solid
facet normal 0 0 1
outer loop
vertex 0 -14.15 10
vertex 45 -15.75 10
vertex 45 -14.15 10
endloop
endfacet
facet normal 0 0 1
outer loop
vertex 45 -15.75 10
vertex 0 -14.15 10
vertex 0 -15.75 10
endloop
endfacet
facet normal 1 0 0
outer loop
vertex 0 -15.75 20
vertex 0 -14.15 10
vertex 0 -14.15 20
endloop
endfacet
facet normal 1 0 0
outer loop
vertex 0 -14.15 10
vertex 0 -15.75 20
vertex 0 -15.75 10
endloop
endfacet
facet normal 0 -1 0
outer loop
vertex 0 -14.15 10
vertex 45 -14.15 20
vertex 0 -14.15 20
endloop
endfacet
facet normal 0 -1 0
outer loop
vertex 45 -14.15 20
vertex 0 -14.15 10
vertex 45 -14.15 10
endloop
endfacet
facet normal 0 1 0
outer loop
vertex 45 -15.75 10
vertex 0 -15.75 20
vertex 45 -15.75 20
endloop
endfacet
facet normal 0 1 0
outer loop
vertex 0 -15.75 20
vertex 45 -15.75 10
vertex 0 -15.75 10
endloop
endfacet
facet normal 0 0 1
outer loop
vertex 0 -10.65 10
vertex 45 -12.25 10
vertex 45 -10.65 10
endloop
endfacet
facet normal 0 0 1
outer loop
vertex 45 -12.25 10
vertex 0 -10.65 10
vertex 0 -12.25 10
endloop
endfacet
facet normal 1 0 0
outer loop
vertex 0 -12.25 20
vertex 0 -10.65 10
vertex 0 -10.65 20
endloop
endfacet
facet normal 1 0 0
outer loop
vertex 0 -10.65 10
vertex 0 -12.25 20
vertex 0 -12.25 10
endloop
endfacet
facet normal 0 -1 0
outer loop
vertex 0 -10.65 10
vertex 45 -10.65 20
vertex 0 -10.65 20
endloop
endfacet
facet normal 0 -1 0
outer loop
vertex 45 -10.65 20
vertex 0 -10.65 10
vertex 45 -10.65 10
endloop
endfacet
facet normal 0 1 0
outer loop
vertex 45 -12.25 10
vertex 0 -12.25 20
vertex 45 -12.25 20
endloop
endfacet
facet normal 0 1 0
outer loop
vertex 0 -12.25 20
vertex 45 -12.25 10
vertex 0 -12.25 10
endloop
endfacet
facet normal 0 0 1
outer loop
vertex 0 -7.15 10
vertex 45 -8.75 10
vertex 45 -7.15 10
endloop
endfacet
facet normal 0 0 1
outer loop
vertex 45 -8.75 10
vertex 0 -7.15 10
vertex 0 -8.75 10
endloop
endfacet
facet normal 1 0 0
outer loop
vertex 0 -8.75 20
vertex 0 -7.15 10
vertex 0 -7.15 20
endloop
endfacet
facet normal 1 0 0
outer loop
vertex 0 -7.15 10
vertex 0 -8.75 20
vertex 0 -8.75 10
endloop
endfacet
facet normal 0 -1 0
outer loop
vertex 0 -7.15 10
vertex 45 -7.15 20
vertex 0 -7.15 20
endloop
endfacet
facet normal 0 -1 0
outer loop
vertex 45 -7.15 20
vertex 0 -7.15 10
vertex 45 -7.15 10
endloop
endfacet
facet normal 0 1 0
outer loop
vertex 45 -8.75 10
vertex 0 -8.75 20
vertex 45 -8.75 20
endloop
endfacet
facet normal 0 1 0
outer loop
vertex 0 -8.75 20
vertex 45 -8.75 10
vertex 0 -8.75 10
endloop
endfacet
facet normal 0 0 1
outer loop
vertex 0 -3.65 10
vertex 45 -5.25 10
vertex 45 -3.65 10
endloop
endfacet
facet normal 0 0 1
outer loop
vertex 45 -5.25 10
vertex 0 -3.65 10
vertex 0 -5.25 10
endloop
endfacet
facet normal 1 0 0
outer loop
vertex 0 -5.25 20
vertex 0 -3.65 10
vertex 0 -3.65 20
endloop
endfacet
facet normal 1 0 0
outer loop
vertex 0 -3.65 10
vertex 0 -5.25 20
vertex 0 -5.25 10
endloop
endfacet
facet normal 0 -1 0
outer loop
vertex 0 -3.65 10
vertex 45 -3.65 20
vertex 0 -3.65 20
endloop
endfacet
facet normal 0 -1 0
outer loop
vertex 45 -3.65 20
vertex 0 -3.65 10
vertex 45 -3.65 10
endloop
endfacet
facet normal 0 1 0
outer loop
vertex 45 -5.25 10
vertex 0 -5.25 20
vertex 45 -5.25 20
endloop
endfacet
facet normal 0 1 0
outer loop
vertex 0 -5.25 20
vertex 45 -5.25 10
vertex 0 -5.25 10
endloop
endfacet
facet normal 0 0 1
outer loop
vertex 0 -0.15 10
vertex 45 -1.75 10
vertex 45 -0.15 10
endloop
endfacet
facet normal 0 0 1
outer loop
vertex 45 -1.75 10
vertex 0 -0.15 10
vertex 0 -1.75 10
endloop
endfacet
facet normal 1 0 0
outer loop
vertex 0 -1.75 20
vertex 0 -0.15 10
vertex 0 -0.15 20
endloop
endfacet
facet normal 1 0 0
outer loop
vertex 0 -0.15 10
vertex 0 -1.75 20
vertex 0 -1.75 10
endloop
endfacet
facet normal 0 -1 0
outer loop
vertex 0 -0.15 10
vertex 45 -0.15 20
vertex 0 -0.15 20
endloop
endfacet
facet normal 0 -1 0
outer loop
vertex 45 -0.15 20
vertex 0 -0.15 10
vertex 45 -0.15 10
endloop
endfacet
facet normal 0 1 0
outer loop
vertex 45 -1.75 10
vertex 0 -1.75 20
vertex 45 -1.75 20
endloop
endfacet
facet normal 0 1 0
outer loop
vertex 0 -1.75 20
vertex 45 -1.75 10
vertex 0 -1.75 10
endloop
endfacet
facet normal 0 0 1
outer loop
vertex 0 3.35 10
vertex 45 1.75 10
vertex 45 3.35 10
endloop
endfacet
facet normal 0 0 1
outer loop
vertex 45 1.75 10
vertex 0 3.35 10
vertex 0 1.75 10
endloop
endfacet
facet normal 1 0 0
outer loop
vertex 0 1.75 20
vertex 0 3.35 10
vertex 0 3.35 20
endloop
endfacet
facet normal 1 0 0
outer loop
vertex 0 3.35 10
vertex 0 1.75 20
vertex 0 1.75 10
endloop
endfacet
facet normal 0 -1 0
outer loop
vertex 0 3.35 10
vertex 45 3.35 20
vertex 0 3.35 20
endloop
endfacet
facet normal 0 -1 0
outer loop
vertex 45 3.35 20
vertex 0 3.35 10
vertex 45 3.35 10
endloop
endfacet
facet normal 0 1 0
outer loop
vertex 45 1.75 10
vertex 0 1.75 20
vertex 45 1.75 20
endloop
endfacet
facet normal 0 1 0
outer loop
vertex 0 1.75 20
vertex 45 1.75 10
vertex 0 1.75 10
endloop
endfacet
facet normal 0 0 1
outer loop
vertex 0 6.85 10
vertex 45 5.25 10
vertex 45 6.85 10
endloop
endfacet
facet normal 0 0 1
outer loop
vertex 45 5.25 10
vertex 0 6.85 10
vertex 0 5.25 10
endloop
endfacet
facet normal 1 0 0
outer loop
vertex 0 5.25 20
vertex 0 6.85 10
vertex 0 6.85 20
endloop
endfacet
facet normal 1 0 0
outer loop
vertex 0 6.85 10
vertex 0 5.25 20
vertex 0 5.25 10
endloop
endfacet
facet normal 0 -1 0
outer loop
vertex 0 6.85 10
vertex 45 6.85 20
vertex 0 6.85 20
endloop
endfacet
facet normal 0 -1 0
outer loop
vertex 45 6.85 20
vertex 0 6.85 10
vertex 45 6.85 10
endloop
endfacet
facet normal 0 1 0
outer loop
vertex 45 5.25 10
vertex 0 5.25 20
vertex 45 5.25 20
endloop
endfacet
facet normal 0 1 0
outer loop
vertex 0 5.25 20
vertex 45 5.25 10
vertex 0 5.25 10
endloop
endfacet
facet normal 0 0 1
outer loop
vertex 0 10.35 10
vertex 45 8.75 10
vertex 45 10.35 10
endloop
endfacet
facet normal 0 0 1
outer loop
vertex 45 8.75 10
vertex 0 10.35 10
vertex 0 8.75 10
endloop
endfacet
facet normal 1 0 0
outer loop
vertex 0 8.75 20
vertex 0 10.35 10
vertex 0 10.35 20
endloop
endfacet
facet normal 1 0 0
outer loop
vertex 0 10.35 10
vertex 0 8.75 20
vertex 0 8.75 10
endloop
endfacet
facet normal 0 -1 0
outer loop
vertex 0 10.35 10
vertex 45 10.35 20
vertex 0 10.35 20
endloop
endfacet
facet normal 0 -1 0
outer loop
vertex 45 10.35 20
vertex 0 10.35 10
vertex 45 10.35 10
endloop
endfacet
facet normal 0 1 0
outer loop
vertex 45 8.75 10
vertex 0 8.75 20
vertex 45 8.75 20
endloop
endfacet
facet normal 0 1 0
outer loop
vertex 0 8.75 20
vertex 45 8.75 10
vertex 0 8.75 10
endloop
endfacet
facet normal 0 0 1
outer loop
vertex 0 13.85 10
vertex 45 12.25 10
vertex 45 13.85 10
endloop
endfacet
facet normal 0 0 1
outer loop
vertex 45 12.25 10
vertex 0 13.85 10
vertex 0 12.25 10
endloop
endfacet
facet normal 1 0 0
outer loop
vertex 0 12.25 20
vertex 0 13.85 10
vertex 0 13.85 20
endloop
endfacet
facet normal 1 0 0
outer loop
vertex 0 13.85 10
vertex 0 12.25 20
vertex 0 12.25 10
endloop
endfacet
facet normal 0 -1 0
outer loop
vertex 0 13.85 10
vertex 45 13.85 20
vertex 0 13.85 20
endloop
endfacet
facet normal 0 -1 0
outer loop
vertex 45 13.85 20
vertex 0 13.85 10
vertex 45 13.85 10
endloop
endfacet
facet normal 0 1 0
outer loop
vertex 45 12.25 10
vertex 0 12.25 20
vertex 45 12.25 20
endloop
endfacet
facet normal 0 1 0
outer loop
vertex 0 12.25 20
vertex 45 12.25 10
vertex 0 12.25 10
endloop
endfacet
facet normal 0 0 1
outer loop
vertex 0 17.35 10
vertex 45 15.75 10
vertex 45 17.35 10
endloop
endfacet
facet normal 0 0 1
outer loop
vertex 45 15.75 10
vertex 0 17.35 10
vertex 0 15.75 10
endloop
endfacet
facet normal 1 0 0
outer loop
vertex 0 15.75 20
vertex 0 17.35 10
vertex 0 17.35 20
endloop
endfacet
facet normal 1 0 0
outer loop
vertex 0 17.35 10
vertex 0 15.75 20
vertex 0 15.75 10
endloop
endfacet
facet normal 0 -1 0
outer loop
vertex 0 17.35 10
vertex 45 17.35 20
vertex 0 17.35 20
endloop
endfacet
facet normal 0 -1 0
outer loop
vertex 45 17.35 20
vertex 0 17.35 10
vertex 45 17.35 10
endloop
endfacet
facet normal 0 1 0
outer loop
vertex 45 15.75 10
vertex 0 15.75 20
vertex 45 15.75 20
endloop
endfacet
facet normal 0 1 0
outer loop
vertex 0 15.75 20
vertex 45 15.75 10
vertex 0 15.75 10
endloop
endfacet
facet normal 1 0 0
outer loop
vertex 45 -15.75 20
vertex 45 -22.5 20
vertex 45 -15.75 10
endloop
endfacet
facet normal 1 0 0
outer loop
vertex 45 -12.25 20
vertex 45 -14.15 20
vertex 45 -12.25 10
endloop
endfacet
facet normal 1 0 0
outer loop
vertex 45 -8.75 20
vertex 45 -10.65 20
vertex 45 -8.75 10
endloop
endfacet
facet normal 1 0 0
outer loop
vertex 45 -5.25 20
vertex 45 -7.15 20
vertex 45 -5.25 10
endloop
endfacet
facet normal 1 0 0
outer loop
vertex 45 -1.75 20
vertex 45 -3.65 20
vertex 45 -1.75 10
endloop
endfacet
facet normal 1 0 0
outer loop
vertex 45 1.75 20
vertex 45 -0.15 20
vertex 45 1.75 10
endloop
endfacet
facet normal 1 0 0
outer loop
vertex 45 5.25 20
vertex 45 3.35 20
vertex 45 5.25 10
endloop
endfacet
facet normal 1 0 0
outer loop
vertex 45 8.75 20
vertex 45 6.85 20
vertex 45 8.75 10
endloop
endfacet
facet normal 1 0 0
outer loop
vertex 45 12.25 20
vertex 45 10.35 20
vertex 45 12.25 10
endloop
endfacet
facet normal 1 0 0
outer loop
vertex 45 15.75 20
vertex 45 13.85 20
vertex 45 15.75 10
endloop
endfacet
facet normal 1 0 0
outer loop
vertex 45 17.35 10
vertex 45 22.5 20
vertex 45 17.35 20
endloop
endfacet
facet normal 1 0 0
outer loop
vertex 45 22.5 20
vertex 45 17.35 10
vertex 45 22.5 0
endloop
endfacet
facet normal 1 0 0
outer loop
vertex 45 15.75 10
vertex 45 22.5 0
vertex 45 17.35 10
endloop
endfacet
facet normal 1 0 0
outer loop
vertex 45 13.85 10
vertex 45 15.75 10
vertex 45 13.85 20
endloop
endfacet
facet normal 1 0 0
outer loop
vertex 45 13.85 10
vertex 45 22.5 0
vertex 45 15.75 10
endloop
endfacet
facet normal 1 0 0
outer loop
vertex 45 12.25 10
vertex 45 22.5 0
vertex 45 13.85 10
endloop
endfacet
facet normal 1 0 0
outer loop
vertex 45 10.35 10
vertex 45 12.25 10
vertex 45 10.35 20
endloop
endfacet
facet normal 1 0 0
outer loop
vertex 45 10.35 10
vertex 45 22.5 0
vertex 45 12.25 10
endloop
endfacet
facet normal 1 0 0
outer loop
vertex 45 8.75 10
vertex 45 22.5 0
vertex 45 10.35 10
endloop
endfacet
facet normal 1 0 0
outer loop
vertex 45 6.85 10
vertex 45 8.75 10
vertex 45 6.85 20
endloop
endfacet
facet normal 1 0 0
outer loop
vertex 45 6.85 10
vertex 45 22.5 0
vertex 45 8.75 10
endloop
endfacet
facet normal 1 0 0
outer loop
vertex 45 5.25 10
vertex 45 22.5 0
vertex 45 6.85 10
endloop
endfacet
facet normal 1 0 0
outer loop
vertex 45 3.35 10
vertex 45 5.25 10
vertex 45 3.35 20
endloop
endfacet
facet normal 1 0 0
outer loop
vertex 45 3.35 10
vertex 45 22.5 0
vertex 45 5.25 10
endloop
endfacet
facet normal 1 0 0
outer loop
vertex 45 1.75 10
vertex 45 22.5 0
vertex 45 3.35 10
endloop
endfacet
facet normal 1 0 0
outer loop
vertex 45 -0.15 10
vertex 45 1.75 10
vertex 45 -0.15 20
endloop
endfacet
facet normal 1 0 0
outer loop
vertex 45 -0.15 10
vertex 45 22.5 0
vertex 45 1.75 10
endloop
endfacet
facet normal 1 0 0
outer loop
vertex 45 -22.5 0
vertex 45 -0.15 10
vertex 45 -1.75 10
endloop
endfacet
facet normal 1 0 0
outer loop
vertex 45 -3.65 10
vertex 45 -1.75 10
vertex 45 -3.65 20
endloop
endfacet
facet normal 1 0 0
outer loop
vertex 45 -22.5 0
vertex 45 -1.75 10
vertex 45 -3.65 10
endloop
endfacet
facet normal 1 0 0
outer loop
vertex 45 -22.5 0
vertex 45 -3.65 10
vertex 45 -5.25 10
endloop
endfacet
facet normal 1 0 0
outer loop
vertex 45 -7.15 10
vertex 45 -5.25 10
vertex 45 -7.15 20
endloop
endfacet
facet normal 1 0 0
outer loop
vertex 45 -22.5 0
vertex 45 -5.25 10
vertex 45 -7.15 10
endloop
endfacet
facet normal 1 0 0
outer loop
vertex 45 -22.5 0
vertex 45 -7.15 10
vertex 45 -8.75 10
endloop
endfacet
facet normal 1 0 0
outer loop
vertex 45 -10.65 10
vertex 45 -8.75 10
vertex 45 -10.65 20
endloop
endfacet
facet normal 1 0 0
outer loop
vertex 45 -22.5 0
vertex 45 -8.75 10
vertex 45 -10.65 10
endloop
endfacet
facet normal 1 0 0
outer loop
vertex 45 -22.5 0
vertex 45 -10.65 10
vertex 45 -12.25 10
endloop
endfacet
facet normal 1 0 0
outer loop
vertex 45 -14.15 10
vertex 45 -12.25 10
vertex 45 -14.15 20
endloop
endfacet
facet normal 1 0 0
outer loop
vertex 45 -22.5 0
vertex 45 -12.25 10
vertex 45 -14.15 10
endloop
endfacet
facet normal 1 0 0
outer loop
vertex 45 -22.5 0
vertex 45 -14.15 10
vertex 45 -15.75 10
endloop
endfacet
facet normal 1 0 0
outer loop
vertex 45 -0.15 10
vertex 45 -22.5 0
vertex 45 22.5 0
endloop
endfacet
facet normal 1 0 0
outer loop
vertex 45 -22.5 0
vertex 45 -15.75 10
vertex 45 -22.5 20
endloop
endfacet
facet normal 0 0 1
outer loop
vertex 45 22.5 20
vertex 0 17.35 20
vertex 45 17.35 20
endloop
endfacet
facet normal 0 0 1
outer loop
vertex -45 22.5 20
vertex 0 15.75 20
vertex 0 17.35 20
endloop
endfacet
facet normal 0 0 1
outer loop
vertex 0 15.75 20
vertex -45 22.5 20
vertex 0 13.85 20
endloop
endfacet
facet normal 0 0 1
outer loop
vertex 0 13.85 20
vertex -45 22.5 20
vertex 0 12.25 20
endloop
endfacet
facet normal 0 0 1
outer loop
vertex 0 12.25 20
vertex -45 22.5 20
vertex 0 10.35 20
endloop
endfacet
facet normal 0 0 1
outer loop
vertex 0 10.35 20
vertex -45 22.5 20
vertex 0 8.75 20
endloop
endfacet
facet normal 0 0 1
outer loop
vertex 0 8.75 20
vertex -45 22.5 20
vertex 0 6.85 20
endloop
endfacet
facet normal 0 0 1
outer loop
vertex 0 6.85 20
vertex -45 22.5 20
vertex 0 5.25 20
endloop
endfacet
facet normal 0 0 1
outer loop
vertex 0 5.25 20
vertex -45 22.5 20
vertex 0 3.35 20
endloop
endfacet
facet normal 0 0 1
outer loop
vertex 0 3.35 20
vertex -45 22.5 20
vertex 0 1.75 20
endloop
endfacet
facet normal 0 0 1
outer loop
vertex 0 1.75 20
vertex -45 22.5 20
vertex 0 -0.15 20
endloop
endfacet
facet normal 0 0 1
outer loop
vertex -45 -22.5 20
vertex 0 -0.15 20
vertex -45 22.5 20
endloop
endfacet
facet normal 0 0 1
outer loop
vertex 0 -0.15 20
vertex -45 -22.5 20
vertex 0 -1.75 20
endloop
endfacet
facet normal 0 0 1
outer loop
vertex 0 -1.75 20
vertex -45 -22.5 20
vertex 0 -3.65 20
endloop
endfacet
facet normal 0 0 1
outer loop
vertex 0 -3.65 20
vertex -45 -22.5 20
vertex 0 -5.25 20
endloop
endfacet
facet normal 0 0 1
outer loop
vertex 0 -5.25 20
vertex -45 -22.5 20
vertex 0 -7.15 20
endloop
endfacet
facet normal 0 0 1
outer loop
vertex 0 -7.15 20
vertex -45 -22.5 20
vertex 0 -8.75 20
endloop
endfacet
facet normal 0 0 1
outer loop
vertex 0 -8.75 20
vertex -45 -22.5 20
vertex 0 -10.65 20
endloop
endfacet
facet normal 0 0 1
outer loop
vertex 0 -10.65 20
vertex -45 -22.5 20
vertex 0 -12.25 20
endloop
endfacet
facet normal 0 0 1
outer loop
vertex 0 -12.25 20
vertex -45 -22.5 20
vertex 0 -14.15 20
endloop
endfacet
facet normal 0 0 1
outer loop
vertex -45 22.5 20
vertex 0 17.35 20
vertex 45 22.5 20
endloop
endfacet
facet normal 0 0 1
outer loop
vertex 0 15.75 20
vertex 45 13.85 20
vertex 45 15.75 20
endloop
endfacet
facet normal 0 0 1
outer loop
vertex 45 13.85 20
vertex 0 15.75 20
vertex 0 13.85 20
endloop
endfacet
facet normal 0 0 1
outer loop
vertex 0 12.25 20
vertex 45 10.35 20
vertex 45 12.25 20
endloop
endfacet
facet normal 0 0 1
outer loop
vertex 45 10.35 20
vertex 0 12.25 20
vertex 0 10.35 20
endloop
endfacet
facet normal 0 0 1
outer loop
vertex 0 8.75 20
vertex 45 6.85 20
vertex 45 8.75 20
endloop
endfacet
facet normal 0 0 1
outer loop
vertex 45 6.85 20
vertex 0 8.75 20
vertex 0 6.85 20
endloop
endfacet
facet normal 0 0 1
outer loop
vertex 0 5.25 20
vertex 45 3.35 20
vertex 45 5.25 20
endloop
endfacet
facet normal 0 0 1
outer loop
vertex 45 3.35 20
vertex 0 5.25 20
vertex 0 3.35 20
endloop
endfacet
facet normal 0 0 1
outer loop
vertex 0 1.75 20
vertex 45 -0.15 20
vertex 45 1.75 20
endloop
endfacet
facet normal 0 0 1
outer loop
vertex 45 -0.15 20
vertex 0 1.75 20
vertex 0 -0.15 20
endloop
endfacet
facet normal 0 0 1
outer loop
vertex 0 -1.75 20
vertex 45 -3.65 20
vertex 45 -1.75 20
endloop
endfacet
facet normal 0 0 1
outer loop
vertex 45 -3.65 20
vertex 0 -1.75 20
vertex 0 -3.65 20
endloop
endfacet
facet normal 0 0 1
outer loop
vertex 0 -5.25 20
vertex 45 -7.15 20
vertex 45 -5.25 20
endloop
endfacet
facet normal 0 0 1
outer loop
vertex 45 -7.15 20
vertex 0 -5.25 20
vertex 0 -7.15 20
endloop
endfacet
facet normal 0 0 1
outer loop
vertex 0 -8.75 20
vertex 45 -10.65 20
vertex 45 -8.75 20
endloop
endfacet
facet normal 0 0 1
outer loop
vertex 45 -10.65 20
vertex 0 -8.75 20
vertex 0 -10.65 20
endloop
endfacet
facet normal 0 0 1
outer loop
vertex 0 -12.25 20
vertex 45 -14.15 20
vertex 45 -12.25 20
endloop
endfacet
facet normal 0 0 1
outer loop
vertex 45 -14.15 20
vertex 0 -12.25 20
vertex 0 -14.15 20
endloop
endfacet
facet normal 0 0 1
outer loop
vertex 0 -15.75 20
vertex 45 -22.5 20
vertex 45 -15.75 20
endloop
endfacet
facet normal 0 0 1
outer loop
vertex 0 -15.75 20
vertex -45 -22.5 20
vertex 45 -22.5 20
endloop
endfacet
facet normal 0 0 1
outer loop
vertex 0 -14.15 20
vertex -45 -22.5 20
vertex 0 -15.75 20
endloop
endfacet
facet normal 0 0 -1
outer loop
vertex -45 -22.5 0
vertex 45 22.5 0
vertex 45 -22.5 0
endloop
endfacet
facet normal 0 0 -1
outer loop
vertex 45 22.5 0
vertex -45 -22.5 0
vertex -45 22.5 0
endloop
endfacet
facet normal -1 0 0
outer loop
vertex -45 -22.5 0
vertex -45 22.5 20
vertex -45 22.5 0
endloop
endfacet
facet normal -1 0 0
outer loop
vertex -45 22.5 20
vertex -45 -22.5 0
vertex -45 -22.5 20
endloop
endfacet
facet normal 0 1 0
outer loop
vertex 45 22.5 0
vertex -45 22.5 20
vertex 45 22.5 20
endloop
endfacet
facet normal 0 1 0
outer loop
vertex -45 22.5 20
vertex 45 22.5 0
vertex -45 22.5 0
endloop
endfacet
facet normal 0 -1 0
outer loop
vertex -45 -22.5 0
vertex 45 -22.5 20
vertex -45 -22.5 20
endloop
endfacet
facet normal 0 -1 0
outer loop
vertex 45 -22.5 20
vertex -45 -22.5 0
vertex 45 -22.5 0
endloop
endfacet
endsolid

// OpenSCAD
// Slide drying rack for microscope slides (75 x 25 x 1 mm)
// Print orientation: base on XY plane, slots open upward (+Z)

// ---------- Block ----------
block_len   = 90;    // block length along X (mm)
block_wid   = 45;    // block width along Y (mm)
block_ht    = 20;    // block height along Z (mm)

// ---------- Slots ----------
slot_count  = 10;    // number of slide slots
slot_len    = 77;    // slot length along X (mm)
slot_wid    = 1.6;   // slot width along Y (mm)
slot_depth  = 10;    // slot depth from top face (mm)
slot_pitch  = 3.5;   // centre-to-centre spacing in Y (mm)

// ---------- Misc ----------
eps         = 0.5;   // overshoot for clean boolean cuts (mm)
$fn         = 64;    // curve resolution

// Derived
first_y = -(slot_count - 1) * slot_pitch / 2;  // Y of first slot centre

difference() {
    // Base block, centred in X/Y, sitting on z = 0
    translate([-block_len / 2, -block_wid / 2, 0])
        cube([block_len, block_wid, block_ht]);

    // Slots, open at the top
    for (i = [0 : slot_count - 1]) {
        translate([0, first_y + i * slot_pitch, block_ht - slot_depth])
            cube([slot_len, slot_wid, slot_depth + eps]);
    }
}
